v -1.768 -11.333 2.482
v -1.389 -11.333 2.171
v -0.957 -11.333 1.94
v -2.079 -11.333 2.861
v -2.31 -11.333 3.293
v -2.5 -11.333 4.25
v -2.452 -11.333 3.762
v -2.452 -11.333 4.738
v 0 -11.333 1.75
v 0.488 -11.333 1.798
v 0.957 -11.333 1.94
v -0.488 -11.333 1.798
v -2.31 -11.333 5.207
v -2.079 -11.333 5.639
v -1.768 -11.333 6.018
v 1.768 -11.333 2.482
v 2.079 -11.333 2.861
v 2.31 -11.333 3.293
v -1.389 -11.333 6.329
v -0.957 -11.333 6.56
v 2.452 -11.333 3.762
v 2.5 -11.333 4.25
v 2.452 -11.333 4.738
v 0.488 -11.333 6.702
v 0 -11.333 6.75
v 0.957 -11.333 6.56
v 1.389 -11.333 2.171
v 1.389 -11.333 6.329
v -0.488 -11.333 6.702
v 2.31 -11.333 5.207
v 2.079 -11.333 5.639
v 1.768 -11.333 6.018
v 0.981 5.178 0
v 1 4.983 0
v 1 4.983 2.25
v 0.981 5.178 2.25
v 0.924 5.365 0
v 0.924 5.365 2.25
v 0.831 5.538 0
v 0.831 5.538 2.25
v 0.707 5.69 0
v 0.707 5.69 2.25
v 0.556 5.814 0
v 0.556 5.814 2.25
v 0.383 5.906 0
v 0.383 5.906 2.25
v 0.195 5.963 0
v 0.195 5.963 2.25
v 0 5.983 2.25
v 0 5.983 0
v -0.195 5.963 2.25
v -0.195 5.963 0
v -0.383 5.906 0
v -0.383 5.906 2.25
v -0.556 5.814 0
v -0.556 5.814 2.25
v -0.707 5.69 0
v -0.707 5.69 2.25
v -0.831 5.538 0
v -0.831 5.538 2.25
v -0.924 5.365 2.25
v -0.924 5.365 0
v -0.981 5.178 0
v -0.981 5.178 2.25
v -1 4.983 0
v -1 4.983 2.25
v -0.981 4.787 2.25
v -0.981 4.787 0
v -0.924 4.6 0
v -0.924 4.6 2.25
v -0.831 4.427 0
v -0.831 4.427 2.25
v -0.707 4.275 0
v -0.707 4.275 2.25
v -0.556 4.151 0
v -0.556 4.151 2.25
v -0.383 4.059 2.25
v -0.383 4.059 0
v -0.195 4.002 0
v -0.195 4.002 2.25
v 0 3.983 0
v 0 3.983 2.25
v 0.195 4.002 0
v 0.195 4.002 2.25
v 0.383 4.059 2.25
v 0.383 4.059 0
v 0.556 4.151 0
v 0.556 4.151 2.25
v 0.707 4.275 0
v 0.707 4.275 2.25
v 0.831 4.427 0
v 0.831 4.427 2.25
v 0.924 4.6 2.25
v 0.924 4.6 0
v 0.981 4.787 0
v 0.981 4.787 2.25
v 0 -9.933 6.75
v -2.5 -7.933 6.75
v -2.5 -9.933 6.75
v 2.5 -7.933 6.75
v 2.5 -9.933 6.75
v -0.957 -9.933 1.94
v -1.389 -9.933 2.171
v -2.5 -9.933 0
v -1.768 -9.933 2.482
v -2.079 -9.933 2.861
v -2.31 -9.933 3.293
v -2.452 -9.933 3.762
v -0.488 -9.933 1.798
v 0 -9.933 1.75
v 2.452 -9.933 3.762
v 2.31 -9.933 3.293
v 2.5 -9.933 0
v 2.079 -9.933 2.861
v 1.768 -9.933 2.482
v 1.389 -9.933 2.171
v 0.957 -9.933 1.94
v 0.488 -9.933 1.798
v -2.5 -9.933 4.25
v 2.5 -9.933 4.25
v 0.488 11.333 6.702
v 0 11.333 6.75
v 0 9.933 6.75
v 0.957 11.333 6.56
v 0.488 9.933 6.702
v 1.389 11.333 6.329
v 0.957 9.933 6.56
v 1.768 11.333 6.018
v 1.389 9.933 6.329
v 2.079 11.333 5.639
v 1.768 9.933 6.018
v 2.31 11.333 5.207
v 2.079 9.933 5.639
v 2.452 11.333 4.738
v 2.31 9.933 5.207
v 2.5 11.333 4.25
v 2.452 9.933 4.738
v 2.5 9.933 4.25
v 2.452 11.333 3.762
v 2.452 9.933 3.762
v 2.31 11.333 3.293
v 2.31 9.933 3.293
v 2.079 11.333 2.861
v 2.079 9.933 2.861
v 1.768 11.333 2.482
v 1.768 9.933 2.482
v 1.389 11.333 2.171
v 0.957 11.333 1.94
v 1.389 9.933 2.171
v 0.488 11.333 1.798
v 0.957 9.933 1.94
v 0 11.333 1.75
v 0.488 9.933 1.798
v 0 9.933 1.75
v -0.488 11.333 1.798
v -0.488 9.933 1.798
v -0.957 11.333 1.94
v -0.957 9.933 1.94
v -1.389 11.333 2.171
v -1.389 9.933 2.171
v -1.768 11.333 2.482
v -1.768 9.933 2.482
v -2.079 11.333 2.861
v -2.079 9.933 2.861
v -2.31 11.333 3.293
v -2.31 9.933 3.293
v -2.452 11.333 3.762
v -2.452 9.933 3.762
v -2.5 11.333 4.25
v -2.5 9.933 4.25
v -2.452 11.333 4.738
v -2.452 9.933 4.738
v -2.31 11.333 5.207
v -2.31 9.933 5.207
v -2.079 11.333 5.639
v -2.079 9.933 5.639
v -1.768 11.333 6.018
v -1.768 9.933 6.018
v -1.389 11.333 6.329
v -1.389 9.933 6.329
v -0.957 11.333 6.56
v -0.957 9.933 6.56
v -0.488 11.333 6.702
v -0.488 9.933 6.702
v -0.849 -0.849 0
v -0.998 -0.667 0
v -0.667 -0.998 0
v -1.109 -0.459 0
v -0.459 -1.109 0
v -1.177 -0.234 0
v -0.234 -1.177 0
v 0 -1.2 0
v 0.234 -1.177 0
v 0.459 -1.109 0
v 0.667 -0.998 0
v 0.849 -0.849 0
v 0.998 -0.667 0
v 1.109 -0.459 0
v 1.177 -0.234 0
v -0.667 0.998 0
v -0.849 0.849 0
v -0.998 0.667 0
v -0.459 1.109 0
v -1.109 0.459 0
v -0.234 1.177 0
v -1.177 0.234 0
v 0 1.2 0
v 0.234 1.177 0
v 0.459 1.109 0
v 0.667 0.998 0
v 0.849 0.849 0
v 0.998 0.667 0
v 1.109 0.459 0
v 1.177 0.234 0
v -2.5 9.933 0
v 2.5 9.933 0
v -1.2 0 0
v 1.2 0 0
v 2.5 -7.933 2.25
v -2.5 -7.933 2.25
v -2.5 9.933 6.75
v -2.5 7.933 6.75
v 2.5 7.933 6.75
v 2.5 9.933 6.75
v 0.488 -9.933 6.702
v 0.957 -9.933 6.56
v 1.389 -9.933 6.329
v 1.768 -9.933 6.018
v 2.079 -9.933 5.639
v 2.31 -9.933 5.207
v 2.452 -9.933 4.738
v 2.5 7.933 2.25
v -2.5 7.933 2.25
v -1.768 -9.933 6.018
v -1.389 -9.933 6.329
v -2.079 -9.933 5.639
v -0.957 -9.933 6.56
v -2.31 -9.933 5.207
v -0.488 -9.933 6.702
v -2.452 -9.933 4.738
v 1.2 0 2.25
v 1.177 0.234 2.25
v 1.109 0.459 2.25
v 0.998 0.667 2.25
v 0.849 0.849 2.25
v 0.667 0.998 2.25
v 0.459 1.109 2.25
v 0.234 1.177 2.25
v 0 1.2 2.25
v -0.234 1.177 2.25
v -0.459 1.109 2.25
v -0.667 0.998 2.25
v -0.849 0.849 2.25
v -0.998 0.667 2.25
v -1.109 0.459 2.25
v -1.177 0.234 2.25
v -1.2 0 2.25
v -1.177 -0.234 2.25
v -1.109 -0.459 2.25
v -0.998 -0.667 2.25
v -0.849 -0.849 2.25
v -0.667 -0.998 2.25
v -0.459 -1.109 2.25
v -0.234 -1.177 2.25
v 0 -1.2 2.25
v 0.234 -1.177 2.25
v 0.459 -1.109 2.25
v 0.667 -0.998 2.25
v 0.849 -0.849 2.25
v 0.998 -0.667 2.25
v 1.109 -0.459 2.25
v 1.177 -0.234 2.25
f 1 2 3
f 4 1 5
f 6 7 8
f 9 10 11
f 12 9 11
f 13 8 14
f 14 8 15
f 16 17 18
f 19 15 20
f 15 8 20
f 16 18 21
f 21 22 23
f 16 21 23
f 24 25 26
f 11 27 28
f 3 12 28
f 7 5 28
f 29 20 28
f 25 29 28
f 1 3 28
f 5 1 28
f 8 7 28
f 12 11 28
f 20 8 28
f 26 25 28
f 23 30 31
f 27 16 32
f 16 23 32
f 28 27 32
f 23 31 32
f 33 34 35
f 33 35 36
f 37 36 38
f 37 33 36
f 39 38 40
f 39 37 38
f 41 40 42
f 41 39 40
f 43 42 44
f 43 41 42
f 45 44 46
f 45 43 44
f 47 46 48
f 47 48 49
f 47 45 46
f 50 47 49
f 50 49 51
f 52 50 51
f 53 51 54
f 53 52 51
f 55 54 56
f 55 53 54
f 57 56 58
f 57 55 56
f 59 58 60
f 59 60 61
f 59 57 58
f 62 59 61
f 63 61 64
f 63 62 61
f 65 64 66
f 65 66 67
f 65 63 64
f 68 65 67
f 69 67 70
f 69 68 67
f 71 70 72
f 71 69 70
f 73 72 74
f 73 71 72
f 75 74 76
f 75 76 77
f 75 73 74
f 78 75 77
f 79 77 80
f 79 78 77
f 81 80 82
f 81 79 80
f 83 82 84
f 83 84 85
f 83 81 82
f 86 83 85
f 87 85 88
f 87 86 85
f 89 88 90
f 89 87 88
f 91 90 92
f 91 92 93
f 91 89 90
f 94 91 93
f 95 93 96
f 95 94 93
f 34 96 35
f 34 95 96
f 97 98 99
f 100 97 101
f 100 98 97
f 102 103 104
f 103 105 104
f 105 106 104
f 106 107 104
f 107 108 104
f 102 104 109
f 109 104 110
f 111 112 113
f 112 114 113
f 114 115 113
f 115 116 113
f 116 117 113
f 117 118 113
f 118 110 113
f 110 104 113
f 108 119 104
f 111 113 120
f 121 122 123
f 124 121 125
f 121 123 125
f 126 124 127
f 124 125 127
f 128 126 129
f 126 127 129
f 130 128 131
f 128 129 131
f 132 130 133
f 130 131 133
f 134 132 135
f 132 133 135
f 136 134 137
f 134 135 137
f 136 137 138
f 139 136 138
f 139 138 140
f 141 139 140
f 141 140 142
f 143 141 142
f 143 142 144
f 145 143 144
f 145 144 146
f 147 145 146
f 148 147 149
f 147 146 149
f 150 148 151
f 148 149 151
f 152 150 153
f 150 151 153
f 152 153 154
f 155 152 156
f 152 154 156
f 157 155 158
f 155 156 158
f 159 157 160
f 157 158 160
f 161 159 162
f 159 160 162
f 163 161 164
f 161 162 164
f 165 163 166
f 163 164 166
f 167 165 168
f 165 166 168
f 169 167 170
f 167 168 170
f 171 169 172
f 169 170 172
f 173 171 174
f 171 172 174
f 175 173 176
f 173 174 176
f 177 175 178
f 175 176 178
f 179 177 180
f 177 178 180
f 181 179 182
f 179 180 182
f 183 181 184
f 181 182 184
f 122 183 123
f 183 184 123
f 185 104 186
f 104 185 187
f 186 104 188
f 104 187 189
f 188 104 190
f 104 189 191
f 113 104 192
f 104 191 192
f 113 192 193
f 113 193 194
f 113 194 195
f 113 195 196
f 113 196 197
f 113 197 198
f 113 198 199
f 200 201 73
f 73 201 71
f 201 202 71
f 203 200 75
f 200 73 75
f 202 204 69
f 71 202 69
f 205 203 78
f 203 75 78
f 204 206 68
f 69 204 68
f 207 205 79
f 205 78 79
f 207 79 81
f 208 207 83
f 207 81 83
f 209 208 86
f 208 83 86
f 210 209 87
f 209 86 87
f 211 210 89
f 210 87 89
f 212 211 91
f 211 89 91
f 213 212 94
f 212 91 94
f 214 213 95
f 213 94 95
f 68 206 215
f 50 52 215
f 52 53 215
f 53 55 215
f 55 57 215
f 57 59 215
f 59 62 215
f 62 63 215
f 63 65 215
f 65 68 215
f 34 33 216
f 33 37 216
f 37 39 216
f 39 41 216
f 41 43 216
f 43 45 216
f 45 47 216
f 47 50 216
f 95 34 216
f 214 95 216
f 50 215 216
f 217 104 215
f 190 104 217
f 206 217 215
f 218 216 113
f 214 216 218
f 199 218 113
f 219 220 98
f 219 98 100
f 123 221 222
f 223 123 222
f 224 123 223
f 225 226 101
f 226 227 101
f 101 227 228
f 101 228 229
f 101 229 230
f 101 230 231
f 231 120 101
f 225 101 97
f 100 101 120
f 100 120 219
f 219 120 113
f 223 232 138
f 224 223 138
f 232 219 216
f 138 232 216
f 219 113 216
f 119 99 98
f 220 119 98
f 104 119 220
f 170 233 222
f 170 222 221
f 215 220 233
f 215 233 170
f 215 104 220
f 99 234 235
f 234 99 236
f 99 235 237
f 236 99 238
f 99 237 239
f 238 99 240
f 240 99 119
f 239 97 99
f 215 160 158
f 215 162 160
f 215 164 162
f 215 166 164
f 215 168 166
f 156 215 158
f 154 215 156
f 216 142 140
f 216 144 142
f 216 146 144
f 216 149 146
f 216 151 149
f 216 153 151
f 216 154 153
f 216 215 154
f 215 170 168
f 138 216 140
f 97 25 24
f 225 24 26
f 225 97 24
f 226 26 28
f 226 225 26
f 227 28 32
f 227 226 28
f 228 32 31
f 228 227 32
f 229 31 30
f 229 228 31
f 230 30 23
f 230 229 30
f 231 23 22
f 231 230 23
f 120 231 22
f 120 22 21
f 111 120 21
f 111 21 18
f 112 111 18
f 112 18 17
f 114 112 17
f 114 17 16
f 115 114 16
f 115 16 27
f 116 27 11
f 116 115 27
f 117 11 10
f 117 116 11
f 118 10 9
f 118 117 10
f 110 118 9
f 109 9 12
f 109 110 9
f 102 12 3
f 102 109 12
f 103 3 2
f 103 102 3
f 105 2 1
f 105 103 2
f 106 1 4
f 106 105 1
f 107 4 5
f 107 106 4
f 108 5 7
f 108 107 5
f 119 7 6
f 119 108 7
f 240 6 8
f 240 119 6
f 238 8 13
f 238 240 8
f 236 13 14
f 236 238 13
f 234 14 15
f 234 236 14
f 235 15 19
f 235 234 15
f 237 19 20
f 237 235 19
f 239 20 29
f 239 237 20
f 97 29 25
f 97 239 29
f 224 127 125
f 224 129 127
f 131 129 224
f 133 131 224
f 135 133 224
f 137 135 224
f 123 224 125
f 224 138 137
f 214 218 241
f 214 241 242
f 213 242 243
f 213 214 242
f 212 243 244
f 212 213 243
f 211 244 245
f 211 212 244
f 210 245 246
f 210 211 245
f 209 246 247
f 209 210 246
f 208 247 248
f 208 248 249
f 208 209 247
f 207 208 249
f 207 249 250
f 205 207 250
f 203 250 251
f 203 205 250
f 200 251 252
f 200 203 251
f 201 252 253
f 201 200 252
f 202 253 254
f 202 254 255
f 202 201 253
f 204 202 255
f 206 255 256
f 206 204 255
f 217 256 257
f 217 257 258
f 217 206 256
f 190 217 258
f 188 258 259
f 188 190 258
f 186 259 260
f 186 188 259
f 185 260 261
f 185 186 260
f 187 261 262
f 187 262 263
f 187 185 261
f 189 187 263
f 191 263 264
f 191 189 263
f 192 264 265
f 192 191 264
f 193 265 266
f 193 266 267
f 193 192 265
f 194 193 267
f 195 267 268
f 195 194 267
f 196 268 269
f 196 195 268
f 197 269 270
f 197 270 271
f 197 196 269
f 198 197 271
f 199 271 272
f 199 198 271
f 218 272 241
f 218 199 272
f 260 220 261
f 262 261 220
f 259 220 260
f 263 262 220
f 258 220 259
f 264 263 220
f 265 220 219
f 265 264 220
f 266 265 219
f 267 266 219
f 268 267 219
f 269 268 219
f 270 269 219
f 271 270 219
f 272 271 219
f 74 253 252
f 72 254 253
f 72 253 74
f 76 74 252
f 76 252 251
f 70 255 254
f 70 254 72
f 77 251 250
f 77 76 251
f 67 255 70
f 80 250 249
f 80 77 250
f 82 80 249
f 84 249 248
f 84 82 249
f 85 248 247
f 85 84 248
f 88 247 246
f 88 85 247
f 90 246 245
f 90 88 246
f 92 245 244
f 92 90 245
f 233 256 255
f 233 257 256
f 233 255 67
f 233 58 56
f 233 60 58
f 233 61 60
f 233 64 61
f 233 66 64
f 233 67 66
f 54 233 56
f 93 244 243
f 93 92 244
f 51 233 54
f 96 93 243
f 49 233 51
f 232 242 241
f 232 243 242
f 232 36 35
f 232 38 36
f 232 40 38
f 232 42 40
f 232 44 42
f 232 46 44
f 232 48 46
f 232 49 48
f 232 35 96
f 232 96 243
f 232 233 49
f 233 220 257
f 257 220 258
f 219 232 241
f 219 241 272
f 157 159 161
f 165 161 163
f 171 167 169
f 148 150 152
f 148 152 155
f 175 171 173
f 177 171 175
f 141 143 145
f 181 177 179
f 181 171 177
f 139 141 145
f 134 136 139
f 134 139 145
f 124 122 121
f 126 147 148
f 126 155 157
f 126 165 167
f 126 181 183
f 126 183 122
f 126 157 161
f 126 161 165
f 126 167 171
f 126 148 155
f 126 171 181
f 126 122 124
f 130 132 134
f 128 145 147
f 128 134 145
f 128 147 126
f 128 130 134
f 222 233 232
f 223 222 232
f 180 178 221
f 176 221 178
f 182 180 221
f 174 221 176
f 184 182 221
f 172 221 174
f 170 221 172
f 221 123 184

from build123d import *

# Parameters (mm, degrees)
SKETCH_1_W      = 5
SKETCH_1_H      = 19.865848542
SKETCH_1_R      = 1.200000017
SKETCH_1_R_2    = 1.000000001
EXTRUDE_1_DEPTH = 2.25
SKETCH_2_W      = 5
SKETCH_2_H      = 2
EXTRUDE_2_DEPTH = 4.5
SKETCH_3_R      = 2.5
EXTRUDE_3_DEPTH = 1.4


with BuildPart() as part:
    # 草图1 → 凸台-拉伸1 (new body)
    with BuildSketch(Plane.XY):
        Rectangle(SKETCH_1_W, SKETCH_1_H)
        with Locations((-3.5e-08, -2.5e-08)):
            Circle(SKETCH_1_R, mode=Mode.SUBTRACT)
        with Locations((1.04e-07, 4.982520103)):
            Circle(SKETCH_1_R_2, mode=Mode.SUBTRACT)
    extrude(amount=EXTRUDE_1_DEPTH)

    # 草图2 → 凸台-拉伸2 (add)
    with BuildSketch(Plane.XY.offset(2.25)):
        with Locations((0, 8.932924271)):
            Rectangle(SKETCH_2_W, SKETCH_2_H)
        with Locations((0, -8.932924271)):
            Rectangle(SKETCH_2_W, SKETCH_2_H)
    extrude(amount=EXTRUDE_2_DEPTH)

    # 草图3 → 凸台-拉伸3 (add)
    with BuildSketch(Plane(origin=(0, 9.932924271, 0), x_dir=(1, 0, 0), z_dir=(0, 1, 0))):
        with Locations((0, -4.25)):
            Circle(SKETCH_3_R)
    extrude_3 = extrude(amount=EXTRUDE_3_DEPTH)

    # 镜向1: 凸台-拉伸3 across plane
    add(extrude_3.mirror(Plane.ZX))


solid = part.part
